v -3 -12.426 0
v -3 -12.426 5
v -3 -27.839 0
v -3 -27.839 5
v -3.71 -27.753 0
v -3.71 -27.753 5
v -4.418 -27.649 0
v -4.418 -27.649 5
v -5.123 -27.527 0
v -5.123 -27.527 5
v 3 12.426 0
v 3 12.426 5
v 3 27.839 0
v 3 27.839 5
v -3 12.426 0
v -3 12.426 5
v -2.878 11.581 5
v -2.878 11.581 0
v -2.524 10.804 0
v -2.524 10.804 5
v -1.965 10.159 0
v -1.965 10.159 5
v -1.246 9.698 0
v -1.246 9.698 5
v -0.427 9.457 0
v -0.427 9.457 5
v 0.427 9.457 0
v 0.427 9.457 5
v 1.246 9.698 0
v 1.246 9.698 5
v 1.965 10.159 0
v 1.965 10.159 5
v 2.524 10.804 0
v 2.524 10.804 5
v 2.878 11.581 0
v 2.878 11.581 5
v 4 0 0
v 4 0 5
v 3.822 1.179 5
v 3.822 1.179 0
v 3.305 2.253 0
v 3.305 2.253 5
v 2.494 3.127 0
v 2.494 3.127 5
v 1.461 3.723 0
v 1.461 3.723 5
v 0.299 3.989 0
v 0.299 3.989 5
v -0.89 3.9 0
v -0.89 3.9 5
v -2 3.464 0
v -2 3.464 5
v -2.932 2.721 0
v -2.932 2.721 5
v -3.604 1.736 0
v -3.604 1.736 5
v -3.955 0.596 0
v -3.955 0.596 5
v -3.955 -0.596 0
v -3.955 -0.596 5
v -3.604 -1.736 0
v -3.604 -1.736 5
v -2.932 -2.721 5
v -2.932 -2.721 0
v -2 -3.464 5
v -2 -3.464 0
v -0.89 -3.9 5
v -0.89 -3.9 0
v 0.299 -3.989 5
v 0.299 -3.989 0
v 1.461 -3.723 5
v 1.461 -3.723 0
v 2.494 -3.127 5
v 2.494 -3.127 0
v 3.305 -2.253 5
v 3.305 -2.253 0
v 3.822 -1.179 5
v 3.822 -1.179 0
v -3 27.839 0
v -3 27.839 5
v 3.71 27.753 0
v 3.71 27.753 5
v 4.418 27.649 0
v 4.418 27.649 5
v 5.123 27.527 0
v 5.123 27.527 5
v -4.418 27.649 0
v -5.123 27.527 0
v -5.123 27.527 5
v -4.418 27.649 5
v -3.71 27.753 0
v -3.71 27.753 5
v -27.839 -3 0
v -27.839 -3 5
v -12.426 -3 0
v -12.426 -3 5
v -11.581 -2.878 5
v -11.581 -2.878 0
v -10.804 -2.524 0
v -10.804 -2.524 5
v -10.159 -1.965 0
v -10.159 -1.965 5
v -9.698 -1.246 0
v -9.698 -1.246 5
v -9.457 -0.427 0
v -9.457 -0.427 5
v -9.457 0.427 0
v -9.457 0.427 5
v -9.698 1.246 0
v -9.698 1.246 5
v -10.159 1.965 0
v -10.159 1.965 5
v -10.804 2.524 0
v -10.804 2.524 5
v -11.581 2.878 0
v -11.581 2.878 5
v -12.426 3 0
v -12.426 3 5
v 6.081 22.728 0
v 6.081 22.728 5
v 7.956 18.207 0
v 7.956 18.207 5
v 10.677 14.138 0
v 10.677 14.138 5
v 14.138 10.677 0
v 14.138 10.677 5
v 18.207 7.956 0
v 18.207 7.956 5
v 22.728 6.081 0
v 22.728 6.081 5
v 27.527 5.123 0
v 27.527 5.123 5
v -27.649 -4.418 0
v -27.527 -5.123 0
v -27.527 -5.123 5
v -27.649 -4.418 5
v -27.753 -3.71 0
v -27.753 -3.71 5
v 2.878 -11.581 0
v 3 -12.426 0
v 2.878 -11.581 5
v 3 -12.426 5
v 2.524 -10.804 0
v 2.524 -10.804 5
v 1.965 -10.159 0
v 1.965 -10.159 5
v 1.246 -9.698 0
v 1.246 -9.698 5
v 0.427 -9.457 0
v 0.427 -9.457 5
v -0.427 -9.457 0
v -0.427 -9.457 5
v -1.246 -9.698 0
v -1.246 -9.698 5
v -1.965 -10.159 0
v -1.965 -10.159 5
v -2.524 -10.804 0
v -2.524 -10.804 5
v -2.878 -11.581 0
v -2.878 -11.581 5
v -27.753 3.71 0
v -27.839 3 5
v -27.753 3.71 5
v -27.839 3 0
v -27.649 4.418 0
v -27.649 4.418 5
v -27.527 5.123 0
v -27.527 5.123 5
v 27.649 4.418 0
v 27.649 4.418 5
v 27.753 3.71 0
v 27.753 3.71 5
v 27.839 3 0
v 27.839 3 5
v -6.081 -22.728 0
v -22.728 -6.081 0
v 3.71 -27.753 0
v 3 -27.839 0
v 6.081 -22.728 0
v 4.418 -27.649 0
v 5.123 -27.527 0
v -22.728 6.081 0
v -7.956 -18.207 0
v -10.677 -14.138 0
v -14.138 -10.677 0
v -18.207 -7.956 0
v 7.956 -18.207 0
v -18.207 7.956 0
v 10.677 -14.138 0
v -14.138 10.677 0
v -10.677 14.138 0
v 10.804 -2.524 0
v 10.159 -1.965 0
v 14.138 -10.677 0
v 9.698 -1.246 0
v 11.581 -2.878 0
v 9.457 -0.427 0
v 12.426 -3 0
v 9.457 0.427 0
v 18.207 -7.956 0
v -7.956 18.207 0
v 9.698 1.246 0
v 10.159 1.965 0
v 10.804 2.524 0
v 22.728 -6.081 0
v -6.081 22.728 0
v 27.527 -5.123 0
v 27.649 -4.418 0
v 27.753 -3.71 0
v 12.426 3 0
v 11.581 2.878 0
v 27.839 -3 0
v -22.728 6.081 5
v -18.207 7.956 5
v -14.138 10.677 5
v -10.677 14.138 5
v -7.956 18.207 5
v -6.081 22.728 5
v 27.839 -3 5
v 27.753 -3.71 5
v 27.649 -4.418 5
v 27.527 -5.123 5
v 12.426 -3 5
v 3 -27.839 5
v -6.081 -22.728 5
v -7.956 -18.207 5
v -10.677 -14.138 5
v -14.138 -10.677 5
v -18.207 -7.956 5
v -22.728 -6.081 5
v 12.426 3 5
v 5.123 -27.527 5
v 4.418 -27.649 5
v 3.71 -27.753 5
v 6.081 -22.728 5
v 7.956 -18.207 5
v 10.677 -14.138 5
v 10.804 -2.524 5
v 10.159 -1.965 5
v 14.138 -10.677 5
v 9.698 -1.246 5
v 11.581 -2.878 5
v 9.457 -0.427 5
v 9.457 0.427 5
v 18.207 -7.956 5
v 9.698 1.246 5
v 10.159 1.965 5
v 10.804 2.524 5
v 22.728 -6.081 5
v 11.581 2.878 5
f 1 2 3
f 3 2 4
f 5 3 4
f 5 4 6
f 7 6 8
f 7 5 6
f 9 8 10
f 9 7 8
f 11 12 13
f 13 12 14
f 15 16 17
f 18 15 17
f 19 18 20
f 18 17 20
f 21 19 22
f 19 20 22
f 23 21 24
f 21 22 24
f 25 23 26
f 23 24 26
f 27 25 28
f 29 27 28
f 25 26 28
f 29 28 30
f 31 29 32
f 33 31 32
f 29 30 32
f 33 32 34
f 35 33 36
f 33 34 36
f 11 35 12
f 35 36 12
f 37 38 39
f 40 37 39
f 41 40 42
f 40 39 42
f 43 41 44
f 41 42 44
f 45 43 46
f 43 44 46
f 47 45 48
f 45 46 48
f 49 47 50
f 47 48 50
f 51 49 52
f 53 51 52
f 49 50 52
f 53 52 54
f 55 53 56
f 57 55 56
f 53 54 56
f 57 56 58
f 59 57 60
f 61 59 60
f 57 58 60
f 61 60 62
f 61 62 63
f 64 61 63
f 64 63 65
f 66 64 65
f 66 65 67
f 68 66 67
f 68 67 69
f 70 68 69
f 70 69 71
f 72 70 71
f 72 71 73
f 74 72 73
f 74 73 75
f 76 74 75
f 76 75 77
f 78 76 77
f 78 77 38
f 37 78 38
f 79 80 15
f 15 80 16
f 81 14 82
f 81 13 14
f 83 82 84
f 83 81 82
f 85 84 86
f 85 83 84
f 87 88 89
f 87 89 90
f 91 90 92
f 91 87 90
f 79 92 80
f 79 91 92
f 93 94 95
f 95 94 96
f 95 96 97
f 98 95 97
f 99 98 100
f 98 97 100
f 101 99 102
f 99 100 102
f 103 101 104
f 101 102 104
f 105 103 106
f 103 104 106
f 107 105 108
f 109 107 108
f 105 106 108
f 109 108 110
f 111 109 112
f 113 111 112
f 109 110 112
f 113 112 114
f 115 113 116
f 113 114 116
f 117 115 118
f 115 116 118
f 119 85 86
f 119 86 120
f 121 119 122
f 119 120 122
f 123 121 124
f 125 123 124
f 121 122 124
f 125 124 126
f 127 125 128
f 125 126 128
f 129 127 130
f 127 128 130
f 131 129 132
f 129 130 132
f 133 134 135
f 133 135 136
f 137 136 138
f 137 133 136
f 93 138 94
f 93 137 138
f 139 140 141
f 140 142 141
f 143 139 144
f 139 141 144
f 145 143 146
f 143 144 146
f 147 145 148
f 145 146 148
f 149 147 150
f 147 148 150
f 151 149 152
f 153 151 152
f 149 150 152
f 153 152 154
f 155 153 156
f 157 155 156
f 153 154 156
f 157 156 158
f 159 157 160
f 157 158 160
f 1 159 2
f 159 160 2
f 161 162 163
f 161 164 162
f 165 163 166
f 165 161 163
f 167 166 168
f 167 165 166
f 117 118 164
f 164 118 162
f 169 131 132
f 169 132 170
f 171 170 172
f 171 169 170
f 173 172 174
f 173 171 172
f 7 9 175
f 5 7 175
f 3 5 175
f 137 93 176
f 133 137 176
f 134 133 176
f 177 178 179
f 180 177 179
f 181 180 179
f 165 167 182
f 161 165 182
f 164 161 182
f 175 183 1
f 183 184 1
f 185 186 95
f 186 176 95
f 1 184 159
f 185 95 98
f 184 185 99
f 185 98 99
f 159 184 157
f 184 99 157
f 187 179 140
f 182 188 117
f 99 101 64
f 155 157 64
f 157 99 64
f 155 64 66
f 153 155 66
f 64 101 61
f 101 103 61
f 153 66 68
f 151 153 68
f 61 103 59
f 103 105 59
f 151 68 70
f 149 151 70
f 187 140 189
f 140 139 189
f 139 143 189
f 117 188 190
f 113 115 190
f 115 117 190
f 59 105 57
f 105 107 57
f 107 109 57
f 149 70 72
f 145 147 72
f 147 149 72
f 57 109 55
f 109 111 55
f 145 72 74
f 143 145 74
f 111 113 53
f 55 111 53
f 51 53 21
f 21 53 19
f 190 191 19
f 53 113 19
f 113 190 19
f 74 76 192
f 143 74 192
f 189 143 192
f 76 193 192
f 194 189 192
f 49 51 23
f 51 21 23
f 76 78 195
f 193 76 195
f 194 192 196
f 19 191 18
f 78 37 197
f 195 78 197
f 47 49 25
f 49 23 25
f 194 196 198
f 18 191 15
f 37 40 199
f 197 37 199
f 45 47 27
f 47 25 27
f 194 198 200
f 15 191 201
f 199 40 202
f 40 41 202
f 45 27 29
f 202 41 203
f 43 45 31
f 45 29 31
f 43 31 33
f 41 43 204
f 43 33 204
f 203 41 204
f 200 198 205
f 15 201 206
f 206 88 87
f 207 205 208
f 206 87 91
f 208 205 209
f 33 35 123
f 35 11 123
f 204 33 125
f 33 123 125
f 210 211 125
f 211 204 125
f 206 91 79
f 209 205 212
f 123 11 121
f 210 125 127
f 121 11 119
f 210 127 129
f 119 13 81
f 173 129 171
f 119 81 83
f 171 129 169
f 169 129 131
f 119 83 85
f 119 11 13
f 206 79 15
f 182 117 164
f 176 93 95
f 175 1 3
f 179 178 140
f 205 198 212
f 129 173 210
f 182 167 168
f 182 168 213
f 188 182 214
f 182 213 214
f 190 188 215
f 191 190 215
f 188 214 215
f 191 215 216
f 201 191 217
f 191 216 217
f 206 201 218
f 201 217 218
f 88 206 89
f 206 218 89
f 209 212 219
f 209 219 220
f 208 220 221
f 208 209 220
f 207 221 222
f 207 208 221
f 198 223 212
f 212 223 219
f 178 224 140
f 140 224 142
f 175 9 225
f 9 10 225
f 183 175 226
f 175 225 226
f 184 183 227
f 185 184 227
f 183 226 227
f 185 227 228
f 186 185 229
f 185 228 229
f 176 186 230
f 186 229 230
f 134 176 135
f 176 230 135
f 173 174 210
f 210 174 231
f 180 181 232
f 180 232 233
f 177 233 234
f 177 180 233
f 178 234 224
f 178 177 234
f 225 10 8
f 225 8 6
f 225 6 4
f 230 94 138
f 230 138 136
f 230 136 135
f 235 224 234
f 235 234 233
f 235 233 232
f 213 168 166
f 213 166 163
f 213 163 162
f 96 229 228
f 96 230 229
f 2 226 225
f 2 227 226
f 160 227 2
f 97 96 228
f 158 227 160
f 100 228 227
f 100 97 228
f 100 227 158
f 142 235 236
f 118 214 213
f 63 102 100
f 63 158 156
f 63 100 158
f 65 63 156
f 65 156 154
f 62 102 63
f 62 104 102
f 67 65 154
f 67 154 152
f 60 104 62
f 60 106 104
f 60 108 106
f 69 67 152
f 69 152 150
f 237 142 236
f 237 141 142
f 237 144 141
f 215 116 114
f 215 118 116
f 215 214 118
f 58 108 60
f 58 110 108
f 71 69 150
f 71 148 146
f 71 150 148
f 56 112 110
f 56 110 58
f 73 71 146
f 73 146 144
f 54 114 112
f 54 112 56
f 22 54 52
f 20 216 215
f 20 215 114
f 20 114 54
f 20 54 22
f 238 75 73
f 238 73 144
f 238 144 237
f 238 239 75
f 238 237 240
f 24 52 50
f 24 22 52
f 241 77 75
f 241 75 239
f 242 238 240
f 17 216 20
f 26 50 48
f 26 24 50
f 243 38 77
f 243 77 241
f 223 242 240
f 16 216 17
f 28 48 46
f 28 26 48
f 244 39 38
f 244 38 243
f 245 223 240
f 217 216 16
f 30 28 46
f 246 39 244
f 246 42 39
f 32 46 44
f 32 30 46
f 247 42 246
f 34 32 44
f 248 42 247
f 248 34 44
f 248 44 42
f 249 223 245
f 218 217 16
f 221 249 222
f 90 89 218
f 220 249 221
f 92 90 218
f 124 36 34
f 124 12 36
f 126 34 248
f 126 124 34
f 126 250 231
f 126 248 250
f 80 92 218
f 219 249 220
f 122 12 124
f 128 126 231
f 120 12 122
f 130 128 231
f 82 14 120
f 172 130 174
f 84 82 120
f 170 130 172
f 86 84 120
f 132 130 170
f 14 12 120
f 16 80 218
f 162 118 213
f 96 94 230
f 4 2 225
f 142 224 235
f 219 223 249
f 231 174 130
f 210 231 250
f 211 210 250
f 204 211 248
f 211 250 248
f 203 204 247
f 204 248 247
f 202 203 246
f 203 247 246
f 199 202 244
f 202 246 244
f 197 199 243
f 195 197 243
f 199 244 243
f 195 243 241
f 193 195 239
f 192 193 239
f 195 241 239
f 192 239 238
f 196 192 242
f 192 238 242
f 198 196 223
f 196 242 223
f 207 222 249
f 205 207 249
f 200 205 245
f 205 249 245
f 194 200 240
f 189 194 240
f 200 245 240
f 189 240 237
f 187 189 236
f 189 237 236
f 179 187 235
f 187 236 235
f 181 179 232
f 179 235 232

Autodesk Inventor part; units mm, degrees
ref_plane "YZ Plane" through (0, 0, 0) normal (1, 0, 0) x (0, 1, 0)
ref_plane "XZ Plane" through (0, 0, 0) normal (0, 1, 0) x (-1, 0, 0)
ref_plane "XY Plane" through (0, 0, 0) normal (0, 0, 1) x (1, 0, 0)
sketch "Sketch1" plane through (0, 0, 0) normal (0, 0, 1) x (1, 0, 0)
  circle A0 centre (0, 0) radius 28
  dimension "d0" = 56
extrude "Extrusion1" add sketch "Sketch1" along normal blind 5
sketch "Sketch2" plane through (0, 0, 5) normal (0, 0, 1) x (1, 0, 0)
  line L0 (0, 0) -> (30, 0) construction
  line L1 (30, 0) -> (30, 30) construction
  line L2 (30, 30) -> (0, 30) construction
  line L3 (0, 30) -> (0, 0) construction
  circle A0 centre (0, 0) radius 30 construction
  circle A1 centre (30, 30) radius 30 construction
  circle A2 centre (0, 0) radius 12.4264 construction
  circle A3 centre (30, 30) radius 25
  circle A4 centre (0, 0) radius 4
  line L4 (12.4264, 0) -> (30, 0) construction
  line L5 (12.4264, -3) -> (30, -3)
  line L6 (30, 3) -> (12.4264, 3)
  arc A5 (12.4264, 3) -> (12.4264, -3) centre (12.4264, 0) ccw
  arc A6 (30, -3) -> (30, 3) centre (30, 0) ccw
  point P0 (21.2132, 0)
  dimension "d5" = 60
  dimension "d3" = 30
  dimension "d4" = 30
  dimension "d6" = 60
  dimension "d7" = 50
  dimension "d8" = 8
  dimension "d9" = 6
extrude "Extrusion2" cut sketch "Sketch2" against normal blind 5
pattern_circular "Circular Pattern1" count 4 over 360 about axis through (0, 0, 5) along (0, 0, -1) of "Extrusion2"
properties part number "Geneva_driven"
